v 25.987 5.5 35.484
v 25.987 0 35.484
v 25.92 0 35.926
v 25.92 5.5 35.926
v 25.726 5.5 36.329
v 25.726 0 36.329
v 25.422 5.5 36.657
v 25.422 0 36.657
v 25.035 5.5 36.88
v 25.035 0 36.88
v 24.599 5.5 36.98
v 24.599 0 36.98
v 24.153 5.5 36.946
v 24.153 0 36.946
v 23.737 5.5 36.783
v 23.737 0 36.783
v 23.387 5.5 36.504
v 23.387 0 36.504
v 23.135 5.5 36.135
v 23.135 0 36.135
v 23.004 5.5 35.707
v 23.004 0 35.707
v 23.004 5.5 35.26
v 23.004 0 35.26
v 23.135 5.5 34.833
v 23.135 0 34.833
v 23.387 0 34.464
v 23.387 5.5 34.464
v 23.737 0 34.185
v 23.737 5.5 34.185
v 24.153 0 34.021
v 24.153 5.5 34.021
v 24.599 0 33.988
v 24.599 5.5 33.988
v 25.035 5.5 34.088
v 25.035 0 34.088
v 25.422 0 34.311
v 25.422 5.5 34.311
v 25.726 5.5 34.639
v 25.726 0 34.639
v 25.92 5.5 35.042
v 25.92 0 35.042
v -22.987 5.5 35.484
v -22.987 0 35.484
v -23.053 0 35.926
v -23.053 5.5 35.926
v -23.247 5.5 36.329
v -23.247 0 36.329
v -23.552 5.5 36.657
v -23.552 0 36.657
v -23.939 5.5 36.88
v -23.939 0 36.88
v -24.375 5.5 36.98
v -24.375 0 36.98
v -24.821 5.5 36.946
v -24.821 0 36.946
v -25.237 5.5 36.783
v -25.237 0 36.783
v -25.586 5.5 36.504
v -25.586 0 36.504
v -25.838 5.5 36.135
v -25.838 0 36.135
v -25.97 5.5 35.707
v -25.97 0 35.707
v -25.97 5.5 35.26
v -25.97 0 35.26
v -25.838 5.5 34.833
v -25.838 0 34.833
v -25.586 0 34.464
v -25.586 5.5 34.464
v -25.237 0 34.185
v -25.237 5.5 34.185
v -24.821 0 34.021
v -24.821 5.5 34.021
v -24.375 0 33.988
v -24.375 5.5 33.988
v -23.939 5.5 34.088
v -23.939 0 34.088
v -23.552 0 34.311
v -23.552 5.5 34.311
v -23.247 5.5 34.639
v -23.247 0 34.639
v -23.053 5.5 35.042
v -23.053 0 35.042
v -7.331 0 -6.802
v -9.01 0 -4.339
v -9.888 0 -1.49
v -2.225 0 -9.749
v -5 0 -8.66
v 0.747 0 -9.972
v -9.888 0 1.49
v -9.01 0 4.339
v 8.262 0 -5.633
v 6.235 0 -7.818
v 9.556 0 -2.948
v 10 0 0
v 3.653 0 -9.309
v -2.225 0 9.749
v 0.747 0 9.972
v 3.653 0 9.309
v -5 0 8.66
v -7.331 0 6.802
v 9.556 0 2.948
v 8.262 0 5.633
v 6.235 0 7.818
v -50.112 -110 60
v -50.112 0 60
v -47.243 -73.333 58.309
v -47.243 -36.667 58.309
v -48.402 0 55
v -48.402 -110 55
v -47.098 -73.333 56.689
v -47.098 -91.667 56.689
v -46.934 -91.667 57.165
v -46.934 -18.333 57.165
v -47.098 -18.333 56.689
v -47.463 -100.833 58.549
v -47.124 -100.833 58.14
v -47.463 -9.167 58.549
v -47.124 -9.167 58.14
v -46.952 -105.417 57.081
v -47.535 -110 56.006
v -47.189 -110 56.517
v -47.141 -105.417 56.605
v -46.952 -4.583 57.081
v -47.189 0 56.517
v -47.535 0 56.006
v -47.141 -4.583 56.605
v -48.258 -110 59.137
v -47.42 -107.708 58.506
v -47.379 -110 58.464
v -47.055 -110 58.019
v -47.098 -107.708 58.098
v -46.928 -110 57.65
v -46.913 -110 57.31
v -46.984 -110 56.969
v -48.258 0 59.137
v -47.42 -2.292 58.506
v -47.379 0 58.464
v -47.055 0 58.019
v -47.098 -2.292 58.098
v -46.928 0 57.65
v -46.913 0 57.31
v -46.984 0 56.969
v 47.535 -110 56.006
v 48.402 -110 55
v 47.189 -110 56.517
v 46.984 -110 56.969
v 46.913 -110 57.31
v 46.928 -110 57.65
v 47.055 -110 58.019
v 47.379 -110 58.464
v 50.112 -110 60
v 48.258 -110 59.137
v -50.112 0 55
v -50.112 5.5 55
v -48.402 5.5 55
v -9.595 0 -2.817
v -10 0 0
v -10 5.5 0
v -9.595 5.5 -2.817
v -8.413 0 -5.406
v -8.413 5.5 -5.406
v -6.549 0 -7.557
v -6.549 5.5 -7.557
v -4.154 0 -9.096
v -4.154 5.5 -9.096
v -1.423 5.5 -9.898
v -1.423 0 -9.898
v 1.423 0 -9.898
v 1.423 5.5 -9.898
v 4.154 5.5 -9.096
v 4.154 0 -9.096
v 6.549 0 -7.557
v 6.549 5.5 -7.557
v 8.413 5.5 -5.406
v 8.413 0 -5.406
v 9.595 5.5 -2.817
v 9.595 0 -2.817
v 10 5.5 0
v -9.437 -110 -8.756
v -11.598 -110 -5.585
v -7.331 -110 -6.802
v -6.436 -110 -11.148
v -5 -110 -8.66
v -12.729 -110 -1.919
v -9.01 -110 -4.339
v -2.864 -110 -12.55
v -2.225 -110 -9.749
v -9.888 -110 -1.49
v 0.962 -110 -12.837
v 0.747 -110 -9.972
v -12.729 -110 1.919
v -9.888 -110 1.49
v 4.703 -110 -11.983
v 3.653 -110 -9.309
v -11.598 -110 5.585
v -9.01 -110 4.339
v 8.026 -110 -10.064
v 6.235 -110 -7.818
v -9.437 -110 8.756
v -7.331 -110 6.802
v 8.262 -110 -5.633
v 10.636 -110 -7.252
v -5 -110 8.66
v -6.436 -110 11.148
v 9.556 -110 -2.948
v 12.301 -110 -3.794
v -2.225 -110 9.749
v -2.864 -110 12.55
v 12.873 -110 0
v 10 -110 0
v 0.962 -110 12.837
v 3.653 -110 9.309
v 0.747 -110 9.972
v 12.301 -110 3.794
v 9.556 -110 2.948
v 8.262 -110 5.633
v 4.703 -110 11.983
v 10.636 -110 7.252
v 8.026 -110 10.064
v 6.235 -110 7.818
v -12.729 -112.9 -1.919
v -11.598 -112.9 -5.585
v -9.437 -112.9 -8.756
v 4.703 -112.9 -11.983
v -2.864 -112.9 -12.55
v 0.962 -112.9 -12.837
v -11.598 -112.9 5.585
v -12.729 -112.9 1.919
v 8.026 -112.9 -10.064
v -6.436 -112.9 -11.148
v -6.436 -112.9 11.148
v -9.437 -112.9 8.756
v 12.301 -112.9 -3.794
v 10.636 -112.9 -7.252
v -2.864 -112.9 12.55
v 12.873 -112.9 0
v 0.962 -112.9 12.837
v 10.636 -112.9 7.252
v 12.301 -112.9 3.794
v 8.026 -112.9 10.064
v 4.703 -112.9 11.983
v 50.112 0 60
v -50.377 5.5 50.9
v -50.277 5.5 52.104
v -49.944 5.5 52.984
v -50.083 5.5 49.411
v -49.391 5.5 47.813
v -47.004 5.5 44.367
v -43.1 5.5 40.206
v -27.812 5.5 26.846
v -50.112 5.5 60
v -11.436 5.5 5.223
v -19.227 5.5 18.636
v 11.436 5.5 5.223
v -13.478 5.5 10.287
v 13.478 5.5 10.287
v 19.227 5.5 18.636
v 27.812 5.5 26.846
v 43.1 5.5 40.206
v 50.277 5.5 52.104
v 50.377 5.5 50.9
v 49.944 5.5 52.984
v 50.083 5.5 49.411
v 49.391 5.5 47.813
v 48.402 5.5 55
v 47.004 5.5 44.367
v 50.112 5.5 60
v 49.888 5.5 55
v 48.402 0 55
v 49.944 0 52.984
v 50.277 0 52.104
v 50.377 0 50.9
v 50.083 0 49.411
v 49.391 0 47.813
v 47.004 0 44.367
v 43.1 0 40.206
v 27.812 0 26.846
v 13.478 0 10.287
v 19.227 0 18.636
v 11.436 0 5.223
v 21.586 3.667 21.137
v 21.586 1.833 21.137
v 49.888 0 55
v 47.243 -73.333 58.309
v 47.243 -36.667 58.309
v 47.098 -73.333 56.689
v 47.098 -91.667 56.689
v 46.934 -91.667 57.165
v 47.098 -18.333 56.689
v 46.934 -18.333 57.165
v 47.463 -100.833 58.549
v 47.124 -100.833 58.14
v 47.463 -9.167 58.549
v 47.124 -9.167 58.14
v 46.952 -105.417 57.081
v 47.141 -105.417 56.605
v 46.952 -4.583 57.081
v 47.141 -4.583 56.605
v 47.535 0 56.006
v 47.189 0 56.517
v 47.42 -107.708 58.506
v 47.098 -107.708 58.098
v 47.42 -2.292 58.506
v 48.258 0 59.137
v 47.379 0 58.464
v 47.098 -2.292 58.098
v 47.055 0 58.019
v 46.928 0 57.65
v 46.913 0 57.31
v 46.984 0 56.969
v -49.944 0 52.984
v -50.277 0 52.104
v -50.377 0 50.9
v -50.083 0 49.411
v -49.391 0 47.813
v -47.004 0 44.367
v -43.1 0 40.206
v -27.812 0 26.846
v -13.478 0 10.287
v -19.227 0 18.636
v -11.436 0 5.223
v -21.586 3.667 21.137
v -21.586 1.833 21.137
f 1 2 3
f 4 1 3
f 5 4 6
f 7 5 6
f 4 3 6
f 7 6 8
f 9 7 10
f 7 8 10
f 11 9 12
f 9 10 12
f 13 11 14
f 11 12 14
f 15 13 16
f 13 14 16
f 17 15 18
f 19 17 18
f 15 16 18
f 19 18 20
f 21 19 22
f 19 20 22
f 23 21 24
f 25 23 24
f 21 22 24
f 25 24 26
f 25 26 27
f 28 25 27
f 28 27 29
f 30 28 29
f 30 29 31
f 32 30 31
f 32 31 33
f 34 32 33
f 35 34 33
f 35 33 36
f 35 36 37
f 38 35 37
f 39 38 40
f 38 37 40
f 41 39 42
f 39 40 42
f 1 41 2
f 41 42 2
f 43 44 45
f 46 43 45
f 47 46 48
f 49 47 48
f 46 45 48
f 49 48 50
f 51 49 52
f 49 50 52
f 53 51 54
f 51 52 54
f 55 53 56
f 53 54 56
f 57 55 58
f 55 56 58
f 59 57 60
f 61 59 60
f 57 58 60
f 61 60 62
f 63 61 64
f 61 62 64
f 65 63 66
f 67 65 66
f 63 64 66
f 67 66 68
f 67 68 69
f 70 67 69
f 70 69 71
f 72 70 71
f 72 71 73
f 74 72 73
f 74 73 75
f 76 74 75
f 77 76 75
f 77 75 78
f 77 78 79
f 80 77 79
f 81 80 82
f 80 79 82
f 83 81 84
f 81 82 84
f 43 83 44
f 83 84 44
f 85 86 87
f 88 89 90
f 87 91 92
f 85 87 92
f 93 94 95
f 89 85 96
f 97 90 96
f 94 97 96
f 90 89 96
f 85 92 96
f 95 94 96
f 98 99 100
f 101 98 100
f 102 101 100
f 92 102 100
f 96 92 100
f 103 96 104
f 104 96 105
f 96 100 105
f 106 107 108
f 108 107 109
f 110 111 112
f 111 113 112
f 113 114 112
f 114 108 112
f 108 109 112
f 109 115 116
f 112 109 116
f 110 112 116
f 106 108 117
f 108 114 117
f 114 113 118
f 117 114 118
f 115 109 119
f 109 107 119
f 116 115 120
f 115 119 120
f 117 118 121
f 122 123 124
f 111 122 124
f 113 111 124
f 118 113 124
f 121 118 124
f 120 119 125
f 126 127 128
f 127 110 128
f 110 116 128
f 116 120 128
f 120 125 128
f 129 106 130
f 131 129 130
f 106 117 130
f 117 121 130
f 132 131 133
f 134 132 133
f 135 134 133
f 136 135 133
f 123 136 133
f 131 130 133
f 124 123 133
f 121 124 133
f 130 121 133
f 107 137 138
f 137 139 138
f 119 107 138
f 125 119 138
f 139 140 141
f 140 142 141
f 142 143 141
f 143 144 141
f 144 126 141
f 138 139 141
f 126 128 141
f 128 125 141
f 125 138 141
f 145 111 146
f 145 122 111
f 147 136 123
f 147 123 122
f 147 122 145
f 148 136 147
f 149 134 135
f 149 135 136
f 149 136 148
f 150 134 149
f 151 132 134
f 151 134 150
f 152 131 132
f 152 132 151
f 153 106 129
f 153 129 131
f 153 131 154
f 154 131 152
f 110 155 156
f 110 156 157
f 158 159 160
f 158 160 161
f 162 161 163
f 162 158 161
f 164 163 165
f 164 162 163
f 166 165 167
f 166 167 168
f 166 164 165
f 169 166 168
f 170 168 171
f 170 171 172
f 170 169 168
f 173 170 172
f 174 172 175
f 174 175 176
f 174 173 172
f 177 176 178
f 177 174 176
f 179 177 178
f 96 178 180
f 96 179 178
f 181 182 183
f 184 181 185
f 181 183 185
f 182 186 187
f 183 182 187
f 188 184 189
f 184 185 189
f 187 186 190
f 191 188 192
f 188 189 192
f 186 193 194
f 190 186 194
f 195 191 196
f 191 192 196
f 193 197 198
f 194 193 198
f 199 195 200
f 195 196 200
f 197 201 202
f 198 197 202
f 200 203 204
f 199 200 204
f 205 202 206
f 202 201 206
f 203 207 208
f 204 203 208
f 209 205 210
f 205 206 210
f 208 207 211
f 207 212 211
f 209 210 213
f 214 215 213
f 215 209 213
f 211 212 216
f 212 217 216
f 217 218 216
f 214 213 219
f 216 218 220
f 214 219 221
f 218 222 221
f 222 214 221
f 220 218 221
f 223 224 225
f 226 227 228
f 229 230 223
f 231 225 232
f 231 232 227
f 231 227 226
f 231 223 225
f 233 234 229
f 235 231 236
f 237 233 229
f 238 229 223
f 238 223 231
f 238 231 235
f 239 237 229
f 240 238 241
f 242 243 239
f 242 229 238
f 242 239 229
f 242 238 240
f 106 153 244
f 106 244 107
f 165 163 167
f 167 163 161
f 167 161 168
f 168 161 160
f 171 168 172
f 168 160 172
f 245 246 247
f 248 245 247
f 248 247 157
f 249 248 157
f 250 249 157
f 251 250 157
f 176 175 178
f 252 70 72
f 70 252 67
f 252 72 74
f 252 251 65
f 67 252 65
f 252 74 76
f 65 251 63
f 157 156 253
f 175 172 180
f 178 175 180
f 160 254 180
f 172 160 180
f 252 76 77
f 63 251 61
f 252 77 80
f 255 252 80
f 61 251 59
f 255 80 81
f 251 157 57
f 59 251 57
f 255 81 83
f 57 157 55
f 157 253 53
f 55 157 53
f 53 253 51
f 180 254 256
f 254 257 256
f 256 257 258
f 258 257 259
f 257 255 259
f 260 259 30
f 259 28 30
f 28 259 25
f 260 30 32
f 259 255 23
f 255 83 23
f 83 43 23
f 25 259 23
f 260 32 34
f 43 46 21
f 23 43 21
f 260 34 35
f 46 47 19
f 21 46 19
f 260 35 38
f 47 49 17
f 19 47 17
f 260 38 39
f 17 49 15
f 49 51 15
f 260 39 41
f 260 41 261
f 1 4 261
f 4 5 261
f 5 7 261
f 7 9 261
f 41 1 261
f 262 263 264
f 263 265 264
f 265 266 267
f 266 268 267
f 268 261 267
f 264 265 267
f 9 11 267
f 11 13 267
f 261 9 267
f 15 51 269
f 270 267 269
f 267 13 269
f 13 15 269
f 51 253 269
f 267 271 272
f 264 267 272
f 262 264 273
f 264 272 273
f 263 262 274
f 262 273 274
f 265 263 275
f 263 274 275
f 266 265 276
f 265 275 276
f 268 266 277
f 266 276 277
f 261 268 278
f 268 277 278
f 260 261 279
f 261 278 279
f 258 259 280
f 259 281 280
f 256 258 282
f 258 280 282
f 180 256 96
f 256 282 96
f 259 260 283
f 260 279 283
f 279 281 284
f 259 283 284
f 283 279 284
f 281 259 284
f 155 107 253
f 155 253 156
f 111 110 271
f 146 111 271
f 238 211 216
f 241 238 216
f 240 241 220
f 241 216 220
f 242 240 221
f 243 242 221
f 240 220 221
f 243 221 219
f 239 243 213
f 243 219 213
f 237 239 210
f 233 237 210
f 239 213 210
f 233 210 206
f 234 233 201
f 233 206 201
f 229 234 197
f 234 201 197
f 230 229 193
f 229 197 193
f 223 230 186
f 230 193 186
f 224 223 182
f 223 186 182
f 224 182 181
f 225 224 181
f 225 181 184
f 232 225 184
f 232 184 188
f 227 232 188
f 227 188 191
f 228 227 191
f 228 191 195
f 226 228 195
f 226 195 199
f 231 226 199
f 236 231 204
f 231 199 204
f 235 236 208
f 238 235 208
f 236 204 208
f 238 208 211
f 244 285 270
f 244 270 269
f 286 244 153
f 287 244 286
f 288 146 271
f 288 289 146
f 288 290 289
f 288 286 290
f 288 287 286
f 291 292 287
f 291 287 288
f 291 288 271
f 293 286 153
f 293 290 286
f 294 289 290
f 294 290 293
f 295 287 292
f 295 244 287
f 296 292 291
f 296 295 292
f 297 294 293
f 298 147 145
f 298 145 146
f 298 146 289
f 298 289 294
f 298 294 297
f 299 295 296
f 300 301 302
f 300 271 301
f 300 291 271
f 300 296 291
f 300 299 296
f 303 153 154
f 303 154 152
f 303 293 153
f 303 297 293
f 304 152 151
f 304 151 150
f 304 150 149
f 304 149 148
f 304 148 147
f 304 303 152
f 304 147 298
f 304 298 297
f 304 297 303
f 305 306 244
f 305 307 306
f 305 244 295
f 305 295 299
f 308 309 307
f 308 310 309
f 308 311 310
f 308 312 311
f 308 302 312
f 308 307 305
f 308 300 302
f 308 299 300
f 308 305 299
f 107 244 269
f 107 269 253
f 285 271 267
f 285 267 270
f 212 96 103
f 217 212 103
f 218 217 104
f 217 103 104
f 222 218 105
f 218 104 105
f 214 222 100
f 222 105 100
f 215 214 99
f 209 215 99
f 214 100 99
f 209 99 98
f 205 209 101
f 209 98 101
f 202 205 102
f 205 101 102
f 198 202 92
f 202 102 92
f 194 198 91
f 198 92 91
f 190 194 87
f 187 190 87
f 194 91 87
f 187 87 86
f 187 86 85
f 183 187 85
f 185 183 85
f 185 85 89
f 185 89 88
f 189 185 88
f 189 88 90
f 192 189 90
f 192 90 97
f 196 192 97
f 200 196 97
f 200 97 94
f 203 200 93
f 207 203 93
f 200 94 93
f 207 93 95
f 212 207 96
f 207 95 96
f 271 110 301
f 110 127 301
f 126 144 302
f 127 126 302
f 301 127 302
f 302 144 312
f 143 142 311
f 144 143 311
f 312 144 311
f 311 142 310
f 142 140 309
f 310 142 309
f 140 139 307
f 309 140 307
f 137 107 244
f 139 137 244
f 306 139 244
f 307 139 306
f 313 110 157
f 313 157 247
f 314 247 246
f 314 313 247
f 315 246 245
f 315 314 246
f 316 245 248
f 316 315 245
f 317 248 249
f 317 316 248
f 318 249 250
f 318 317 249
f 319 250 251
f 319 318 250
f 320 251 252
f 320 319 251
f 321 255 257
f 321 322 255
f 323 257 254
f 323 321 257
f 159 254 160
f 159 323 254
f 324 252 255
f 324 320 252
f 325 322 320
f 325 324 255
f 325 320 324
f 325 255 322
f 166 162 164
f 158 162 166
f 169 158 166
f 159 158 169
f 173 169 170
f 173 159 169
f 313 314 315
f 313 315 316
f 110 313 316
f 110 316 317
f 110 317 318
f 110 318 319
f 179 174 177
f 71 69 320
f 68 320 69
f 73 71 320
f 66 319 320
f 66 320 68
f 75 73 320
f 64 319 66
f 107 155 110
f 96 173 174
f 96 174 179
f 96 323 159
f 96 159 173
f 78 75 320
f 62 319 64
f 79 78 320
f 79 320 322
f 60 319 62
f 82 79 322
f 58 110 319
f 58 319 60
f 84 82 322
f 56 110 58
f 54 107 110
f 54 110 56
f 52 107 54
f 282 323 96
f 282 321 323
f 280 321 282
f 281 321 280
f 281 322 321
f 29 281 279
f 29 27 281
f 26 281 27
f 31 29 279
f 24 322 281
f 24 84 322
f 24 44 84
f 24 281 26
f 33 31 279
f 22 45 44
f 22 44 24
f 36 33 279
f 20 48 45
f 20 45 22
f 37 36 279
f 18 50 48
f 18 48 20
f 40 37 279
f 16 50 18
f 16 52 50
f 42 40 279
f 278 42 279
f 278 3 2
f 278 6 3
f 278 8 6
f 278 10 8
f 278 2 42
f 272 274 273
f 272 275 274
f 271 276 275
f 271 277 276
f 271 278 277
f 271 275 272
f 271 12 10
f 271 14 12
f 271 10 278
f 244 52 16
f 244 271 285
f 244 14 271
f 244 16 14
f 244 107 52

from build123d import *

# Parameters (mm, degrees)
F1_DEPTH = 110
F0_R     = 1.5
F2_DEPTH = 5.5
F3_R     = 12.8729147036
F3_R_2   = 10
F4_DEPTH = 2.9


with BuildPart() as f1:
    # F0 (on Front) → F1 (new body)
    with BuildSketch(Plane.XZ):
        with BuildLine():
            Line((-48.4015151421, 55), (48.4015151421, 55))
            add(Edge.make_bspline(
                [(50.1117266903, 60), (45.4576355608, 58.2266837042), (46.7977000249, 56.7705786305), (48.4015151421, 55)],
                knots=[0, 0, 0, 0, 0.1362259725, 0.1362259725, 0.1362259725, 0.1362259725], degree=3))
            Line((50.1117266903, 60), (0, 60))
            Line((0, 60), (-50.1117266903, 60))
            add(Edge.make_bspline(
                [(-50.1117266903, 60), (-45.4576355608, 58.2266837042), (-46.7977000249, 56.7705786305), (-48.4015151421, 55)],
                knots=[0, 0, 0, 0, 0.1362259725, 0.1362259725, 0.1362259725, 0.1362259725], degree=3))
        make_face()
    extrude(amount=F1_DEPTH)


with BuildPart() as f1b:
    # F0 (on Front) → F1, piece 2 (new body)
    with BuildSketch(Plane.XZ):
        with BuildLine():
            ThreePointArc((-10, 0), (0, -10), (10, 0))
            ThreePointArc((10, 0), (0, 10), (-10, 0))
        make_face()
    extrude(amount=F1_DEPTH)

    # F3 (on face) → F4 (join)
    with BuildSketch(Plane.XZ.offset(110)):
        Circle(F3_R)
        Circle(F3_R_2, mode=Mode.SUBTRACT)
        Circle(F3_R_2)
    extrude(amount=F4_DEPTH)


with BuildPart() as f2:
    # F0 (on Front) → F2 (new body)
    with BuildSketch(Plane.XZ):
        with BuildLine():
            ThreePointArc((-10, 0), (0, -10), (10, 0))
            ThreePointArc((10, 0), (0, 10), (-10, 0))
        make_face()
        with BuildLine():
            ThreePointArc((-10, 0), (0, 10), (10, 0))
            add(Edge.make_bspline(
                [(48.4015151421, 55), (49.0587393006, 54.2744381581), (55.5513754439, 47.0704926237), (16.2774669808, 21.2389924544), (11.7528843024, 7.2172997491), (10, 0)],
                knots=[0.1362259725, 0.1362259725, 0.1362259725, 0.1362259725, 0.1920497388, 0.6528842126, 1, 1, 1, 1], degree=3))
            Line((48.4015151421, 55), (-48.4015151421, 55))
            add(Edge.make_bspline(
                [(-48.4015151421, 55), (-49.0587393006, 54.2744381581), (-55.5513754439, 47.0704926237), (-16.2774669808, 21.2389924544), (-11.7528843024, 7.2172997491), (-10, 0)],
                knots=[0.1362259725, 0.1362259725, 0.1362259725, 0.1362259725, 0.1920497388, 0.6528842126, 1, 1, 1, 1], degree=3))
        make_face()
        with Locations((-24.4867997614, 35.4838720158)):
            Circle(F0_R, mode=Mode.SUBTRACT)
        with Locations((24.4867997614, 35.4838720158)):
            Circle(F0_R, mode=Mode.SUBTRACT)
        with BuildLine():
            Line((-48.4015151421, 55), (48.4015151421, 55))
            add(Edge.make_bspline(
                [(50.1117266903, 60), (45.4576355608, 58.2266837042), (46.7977000249, 56.7705786305), (48.4015151421, 55)],
                knots=[0, 0, 0, 0, 0.1362259725, 0.1362259725, 0.1362259725, 0.1362259725], degree=3))
            Line((50.1117266903, 60), (0, 60))
            Line((0, 60), (-50.1117266903, 60))
            add(Edge.make_bspline(
                [(-50.1117266903, 60), (-45.4576355608, 58.2266837042), (-46.7977000249, 56.7705786305), (-48.4015151421, 55)],
                knots=[0, 0, 0, 0, 0.1362259725, 0.1362259725, 0.1362259725, 0.1362259725], degree=3))
        make_face()
        with BuildLine():
            add(Edge.make_bspline(
                [(50.1117266903, 60), (45.4576355608, 58.2266837042), (46.7977000249, 56.7705786305), (48.4015151421, 55)],
                knots=[0, 0, 0, 0, 0.1362259725, 0.1362259725, 0.1362259725, 0.1362259725], degree=3))
            Line((48.4015151421, 55), (49.8882733097, 55))
            Line((49.8882733097, 55), (50.1117266903, 60))
        make_face()
        with BuildLine():
            Line((-50.1117266903, 55), (-48.4015151421, 55))
            add(Edge.make_bspline(
                [(-50.1117266903, 60), (-45.4576355608, 58.2266837042), (-46.7977000249, 56.7705786305), (-48.4015151421, 55)],
                knots=[0, 0, 0, 0, 0.1362259725, 0.1362259725, 0.1362259725, 0.1362259725], degree=3))
            Line((-50.1117266903, 60), (-50.1117266903, 55))
        make_face()
    extrude(amount=-F2_DEPTH)


solid = Compound([f1.part, f1b.part, f2.part])
